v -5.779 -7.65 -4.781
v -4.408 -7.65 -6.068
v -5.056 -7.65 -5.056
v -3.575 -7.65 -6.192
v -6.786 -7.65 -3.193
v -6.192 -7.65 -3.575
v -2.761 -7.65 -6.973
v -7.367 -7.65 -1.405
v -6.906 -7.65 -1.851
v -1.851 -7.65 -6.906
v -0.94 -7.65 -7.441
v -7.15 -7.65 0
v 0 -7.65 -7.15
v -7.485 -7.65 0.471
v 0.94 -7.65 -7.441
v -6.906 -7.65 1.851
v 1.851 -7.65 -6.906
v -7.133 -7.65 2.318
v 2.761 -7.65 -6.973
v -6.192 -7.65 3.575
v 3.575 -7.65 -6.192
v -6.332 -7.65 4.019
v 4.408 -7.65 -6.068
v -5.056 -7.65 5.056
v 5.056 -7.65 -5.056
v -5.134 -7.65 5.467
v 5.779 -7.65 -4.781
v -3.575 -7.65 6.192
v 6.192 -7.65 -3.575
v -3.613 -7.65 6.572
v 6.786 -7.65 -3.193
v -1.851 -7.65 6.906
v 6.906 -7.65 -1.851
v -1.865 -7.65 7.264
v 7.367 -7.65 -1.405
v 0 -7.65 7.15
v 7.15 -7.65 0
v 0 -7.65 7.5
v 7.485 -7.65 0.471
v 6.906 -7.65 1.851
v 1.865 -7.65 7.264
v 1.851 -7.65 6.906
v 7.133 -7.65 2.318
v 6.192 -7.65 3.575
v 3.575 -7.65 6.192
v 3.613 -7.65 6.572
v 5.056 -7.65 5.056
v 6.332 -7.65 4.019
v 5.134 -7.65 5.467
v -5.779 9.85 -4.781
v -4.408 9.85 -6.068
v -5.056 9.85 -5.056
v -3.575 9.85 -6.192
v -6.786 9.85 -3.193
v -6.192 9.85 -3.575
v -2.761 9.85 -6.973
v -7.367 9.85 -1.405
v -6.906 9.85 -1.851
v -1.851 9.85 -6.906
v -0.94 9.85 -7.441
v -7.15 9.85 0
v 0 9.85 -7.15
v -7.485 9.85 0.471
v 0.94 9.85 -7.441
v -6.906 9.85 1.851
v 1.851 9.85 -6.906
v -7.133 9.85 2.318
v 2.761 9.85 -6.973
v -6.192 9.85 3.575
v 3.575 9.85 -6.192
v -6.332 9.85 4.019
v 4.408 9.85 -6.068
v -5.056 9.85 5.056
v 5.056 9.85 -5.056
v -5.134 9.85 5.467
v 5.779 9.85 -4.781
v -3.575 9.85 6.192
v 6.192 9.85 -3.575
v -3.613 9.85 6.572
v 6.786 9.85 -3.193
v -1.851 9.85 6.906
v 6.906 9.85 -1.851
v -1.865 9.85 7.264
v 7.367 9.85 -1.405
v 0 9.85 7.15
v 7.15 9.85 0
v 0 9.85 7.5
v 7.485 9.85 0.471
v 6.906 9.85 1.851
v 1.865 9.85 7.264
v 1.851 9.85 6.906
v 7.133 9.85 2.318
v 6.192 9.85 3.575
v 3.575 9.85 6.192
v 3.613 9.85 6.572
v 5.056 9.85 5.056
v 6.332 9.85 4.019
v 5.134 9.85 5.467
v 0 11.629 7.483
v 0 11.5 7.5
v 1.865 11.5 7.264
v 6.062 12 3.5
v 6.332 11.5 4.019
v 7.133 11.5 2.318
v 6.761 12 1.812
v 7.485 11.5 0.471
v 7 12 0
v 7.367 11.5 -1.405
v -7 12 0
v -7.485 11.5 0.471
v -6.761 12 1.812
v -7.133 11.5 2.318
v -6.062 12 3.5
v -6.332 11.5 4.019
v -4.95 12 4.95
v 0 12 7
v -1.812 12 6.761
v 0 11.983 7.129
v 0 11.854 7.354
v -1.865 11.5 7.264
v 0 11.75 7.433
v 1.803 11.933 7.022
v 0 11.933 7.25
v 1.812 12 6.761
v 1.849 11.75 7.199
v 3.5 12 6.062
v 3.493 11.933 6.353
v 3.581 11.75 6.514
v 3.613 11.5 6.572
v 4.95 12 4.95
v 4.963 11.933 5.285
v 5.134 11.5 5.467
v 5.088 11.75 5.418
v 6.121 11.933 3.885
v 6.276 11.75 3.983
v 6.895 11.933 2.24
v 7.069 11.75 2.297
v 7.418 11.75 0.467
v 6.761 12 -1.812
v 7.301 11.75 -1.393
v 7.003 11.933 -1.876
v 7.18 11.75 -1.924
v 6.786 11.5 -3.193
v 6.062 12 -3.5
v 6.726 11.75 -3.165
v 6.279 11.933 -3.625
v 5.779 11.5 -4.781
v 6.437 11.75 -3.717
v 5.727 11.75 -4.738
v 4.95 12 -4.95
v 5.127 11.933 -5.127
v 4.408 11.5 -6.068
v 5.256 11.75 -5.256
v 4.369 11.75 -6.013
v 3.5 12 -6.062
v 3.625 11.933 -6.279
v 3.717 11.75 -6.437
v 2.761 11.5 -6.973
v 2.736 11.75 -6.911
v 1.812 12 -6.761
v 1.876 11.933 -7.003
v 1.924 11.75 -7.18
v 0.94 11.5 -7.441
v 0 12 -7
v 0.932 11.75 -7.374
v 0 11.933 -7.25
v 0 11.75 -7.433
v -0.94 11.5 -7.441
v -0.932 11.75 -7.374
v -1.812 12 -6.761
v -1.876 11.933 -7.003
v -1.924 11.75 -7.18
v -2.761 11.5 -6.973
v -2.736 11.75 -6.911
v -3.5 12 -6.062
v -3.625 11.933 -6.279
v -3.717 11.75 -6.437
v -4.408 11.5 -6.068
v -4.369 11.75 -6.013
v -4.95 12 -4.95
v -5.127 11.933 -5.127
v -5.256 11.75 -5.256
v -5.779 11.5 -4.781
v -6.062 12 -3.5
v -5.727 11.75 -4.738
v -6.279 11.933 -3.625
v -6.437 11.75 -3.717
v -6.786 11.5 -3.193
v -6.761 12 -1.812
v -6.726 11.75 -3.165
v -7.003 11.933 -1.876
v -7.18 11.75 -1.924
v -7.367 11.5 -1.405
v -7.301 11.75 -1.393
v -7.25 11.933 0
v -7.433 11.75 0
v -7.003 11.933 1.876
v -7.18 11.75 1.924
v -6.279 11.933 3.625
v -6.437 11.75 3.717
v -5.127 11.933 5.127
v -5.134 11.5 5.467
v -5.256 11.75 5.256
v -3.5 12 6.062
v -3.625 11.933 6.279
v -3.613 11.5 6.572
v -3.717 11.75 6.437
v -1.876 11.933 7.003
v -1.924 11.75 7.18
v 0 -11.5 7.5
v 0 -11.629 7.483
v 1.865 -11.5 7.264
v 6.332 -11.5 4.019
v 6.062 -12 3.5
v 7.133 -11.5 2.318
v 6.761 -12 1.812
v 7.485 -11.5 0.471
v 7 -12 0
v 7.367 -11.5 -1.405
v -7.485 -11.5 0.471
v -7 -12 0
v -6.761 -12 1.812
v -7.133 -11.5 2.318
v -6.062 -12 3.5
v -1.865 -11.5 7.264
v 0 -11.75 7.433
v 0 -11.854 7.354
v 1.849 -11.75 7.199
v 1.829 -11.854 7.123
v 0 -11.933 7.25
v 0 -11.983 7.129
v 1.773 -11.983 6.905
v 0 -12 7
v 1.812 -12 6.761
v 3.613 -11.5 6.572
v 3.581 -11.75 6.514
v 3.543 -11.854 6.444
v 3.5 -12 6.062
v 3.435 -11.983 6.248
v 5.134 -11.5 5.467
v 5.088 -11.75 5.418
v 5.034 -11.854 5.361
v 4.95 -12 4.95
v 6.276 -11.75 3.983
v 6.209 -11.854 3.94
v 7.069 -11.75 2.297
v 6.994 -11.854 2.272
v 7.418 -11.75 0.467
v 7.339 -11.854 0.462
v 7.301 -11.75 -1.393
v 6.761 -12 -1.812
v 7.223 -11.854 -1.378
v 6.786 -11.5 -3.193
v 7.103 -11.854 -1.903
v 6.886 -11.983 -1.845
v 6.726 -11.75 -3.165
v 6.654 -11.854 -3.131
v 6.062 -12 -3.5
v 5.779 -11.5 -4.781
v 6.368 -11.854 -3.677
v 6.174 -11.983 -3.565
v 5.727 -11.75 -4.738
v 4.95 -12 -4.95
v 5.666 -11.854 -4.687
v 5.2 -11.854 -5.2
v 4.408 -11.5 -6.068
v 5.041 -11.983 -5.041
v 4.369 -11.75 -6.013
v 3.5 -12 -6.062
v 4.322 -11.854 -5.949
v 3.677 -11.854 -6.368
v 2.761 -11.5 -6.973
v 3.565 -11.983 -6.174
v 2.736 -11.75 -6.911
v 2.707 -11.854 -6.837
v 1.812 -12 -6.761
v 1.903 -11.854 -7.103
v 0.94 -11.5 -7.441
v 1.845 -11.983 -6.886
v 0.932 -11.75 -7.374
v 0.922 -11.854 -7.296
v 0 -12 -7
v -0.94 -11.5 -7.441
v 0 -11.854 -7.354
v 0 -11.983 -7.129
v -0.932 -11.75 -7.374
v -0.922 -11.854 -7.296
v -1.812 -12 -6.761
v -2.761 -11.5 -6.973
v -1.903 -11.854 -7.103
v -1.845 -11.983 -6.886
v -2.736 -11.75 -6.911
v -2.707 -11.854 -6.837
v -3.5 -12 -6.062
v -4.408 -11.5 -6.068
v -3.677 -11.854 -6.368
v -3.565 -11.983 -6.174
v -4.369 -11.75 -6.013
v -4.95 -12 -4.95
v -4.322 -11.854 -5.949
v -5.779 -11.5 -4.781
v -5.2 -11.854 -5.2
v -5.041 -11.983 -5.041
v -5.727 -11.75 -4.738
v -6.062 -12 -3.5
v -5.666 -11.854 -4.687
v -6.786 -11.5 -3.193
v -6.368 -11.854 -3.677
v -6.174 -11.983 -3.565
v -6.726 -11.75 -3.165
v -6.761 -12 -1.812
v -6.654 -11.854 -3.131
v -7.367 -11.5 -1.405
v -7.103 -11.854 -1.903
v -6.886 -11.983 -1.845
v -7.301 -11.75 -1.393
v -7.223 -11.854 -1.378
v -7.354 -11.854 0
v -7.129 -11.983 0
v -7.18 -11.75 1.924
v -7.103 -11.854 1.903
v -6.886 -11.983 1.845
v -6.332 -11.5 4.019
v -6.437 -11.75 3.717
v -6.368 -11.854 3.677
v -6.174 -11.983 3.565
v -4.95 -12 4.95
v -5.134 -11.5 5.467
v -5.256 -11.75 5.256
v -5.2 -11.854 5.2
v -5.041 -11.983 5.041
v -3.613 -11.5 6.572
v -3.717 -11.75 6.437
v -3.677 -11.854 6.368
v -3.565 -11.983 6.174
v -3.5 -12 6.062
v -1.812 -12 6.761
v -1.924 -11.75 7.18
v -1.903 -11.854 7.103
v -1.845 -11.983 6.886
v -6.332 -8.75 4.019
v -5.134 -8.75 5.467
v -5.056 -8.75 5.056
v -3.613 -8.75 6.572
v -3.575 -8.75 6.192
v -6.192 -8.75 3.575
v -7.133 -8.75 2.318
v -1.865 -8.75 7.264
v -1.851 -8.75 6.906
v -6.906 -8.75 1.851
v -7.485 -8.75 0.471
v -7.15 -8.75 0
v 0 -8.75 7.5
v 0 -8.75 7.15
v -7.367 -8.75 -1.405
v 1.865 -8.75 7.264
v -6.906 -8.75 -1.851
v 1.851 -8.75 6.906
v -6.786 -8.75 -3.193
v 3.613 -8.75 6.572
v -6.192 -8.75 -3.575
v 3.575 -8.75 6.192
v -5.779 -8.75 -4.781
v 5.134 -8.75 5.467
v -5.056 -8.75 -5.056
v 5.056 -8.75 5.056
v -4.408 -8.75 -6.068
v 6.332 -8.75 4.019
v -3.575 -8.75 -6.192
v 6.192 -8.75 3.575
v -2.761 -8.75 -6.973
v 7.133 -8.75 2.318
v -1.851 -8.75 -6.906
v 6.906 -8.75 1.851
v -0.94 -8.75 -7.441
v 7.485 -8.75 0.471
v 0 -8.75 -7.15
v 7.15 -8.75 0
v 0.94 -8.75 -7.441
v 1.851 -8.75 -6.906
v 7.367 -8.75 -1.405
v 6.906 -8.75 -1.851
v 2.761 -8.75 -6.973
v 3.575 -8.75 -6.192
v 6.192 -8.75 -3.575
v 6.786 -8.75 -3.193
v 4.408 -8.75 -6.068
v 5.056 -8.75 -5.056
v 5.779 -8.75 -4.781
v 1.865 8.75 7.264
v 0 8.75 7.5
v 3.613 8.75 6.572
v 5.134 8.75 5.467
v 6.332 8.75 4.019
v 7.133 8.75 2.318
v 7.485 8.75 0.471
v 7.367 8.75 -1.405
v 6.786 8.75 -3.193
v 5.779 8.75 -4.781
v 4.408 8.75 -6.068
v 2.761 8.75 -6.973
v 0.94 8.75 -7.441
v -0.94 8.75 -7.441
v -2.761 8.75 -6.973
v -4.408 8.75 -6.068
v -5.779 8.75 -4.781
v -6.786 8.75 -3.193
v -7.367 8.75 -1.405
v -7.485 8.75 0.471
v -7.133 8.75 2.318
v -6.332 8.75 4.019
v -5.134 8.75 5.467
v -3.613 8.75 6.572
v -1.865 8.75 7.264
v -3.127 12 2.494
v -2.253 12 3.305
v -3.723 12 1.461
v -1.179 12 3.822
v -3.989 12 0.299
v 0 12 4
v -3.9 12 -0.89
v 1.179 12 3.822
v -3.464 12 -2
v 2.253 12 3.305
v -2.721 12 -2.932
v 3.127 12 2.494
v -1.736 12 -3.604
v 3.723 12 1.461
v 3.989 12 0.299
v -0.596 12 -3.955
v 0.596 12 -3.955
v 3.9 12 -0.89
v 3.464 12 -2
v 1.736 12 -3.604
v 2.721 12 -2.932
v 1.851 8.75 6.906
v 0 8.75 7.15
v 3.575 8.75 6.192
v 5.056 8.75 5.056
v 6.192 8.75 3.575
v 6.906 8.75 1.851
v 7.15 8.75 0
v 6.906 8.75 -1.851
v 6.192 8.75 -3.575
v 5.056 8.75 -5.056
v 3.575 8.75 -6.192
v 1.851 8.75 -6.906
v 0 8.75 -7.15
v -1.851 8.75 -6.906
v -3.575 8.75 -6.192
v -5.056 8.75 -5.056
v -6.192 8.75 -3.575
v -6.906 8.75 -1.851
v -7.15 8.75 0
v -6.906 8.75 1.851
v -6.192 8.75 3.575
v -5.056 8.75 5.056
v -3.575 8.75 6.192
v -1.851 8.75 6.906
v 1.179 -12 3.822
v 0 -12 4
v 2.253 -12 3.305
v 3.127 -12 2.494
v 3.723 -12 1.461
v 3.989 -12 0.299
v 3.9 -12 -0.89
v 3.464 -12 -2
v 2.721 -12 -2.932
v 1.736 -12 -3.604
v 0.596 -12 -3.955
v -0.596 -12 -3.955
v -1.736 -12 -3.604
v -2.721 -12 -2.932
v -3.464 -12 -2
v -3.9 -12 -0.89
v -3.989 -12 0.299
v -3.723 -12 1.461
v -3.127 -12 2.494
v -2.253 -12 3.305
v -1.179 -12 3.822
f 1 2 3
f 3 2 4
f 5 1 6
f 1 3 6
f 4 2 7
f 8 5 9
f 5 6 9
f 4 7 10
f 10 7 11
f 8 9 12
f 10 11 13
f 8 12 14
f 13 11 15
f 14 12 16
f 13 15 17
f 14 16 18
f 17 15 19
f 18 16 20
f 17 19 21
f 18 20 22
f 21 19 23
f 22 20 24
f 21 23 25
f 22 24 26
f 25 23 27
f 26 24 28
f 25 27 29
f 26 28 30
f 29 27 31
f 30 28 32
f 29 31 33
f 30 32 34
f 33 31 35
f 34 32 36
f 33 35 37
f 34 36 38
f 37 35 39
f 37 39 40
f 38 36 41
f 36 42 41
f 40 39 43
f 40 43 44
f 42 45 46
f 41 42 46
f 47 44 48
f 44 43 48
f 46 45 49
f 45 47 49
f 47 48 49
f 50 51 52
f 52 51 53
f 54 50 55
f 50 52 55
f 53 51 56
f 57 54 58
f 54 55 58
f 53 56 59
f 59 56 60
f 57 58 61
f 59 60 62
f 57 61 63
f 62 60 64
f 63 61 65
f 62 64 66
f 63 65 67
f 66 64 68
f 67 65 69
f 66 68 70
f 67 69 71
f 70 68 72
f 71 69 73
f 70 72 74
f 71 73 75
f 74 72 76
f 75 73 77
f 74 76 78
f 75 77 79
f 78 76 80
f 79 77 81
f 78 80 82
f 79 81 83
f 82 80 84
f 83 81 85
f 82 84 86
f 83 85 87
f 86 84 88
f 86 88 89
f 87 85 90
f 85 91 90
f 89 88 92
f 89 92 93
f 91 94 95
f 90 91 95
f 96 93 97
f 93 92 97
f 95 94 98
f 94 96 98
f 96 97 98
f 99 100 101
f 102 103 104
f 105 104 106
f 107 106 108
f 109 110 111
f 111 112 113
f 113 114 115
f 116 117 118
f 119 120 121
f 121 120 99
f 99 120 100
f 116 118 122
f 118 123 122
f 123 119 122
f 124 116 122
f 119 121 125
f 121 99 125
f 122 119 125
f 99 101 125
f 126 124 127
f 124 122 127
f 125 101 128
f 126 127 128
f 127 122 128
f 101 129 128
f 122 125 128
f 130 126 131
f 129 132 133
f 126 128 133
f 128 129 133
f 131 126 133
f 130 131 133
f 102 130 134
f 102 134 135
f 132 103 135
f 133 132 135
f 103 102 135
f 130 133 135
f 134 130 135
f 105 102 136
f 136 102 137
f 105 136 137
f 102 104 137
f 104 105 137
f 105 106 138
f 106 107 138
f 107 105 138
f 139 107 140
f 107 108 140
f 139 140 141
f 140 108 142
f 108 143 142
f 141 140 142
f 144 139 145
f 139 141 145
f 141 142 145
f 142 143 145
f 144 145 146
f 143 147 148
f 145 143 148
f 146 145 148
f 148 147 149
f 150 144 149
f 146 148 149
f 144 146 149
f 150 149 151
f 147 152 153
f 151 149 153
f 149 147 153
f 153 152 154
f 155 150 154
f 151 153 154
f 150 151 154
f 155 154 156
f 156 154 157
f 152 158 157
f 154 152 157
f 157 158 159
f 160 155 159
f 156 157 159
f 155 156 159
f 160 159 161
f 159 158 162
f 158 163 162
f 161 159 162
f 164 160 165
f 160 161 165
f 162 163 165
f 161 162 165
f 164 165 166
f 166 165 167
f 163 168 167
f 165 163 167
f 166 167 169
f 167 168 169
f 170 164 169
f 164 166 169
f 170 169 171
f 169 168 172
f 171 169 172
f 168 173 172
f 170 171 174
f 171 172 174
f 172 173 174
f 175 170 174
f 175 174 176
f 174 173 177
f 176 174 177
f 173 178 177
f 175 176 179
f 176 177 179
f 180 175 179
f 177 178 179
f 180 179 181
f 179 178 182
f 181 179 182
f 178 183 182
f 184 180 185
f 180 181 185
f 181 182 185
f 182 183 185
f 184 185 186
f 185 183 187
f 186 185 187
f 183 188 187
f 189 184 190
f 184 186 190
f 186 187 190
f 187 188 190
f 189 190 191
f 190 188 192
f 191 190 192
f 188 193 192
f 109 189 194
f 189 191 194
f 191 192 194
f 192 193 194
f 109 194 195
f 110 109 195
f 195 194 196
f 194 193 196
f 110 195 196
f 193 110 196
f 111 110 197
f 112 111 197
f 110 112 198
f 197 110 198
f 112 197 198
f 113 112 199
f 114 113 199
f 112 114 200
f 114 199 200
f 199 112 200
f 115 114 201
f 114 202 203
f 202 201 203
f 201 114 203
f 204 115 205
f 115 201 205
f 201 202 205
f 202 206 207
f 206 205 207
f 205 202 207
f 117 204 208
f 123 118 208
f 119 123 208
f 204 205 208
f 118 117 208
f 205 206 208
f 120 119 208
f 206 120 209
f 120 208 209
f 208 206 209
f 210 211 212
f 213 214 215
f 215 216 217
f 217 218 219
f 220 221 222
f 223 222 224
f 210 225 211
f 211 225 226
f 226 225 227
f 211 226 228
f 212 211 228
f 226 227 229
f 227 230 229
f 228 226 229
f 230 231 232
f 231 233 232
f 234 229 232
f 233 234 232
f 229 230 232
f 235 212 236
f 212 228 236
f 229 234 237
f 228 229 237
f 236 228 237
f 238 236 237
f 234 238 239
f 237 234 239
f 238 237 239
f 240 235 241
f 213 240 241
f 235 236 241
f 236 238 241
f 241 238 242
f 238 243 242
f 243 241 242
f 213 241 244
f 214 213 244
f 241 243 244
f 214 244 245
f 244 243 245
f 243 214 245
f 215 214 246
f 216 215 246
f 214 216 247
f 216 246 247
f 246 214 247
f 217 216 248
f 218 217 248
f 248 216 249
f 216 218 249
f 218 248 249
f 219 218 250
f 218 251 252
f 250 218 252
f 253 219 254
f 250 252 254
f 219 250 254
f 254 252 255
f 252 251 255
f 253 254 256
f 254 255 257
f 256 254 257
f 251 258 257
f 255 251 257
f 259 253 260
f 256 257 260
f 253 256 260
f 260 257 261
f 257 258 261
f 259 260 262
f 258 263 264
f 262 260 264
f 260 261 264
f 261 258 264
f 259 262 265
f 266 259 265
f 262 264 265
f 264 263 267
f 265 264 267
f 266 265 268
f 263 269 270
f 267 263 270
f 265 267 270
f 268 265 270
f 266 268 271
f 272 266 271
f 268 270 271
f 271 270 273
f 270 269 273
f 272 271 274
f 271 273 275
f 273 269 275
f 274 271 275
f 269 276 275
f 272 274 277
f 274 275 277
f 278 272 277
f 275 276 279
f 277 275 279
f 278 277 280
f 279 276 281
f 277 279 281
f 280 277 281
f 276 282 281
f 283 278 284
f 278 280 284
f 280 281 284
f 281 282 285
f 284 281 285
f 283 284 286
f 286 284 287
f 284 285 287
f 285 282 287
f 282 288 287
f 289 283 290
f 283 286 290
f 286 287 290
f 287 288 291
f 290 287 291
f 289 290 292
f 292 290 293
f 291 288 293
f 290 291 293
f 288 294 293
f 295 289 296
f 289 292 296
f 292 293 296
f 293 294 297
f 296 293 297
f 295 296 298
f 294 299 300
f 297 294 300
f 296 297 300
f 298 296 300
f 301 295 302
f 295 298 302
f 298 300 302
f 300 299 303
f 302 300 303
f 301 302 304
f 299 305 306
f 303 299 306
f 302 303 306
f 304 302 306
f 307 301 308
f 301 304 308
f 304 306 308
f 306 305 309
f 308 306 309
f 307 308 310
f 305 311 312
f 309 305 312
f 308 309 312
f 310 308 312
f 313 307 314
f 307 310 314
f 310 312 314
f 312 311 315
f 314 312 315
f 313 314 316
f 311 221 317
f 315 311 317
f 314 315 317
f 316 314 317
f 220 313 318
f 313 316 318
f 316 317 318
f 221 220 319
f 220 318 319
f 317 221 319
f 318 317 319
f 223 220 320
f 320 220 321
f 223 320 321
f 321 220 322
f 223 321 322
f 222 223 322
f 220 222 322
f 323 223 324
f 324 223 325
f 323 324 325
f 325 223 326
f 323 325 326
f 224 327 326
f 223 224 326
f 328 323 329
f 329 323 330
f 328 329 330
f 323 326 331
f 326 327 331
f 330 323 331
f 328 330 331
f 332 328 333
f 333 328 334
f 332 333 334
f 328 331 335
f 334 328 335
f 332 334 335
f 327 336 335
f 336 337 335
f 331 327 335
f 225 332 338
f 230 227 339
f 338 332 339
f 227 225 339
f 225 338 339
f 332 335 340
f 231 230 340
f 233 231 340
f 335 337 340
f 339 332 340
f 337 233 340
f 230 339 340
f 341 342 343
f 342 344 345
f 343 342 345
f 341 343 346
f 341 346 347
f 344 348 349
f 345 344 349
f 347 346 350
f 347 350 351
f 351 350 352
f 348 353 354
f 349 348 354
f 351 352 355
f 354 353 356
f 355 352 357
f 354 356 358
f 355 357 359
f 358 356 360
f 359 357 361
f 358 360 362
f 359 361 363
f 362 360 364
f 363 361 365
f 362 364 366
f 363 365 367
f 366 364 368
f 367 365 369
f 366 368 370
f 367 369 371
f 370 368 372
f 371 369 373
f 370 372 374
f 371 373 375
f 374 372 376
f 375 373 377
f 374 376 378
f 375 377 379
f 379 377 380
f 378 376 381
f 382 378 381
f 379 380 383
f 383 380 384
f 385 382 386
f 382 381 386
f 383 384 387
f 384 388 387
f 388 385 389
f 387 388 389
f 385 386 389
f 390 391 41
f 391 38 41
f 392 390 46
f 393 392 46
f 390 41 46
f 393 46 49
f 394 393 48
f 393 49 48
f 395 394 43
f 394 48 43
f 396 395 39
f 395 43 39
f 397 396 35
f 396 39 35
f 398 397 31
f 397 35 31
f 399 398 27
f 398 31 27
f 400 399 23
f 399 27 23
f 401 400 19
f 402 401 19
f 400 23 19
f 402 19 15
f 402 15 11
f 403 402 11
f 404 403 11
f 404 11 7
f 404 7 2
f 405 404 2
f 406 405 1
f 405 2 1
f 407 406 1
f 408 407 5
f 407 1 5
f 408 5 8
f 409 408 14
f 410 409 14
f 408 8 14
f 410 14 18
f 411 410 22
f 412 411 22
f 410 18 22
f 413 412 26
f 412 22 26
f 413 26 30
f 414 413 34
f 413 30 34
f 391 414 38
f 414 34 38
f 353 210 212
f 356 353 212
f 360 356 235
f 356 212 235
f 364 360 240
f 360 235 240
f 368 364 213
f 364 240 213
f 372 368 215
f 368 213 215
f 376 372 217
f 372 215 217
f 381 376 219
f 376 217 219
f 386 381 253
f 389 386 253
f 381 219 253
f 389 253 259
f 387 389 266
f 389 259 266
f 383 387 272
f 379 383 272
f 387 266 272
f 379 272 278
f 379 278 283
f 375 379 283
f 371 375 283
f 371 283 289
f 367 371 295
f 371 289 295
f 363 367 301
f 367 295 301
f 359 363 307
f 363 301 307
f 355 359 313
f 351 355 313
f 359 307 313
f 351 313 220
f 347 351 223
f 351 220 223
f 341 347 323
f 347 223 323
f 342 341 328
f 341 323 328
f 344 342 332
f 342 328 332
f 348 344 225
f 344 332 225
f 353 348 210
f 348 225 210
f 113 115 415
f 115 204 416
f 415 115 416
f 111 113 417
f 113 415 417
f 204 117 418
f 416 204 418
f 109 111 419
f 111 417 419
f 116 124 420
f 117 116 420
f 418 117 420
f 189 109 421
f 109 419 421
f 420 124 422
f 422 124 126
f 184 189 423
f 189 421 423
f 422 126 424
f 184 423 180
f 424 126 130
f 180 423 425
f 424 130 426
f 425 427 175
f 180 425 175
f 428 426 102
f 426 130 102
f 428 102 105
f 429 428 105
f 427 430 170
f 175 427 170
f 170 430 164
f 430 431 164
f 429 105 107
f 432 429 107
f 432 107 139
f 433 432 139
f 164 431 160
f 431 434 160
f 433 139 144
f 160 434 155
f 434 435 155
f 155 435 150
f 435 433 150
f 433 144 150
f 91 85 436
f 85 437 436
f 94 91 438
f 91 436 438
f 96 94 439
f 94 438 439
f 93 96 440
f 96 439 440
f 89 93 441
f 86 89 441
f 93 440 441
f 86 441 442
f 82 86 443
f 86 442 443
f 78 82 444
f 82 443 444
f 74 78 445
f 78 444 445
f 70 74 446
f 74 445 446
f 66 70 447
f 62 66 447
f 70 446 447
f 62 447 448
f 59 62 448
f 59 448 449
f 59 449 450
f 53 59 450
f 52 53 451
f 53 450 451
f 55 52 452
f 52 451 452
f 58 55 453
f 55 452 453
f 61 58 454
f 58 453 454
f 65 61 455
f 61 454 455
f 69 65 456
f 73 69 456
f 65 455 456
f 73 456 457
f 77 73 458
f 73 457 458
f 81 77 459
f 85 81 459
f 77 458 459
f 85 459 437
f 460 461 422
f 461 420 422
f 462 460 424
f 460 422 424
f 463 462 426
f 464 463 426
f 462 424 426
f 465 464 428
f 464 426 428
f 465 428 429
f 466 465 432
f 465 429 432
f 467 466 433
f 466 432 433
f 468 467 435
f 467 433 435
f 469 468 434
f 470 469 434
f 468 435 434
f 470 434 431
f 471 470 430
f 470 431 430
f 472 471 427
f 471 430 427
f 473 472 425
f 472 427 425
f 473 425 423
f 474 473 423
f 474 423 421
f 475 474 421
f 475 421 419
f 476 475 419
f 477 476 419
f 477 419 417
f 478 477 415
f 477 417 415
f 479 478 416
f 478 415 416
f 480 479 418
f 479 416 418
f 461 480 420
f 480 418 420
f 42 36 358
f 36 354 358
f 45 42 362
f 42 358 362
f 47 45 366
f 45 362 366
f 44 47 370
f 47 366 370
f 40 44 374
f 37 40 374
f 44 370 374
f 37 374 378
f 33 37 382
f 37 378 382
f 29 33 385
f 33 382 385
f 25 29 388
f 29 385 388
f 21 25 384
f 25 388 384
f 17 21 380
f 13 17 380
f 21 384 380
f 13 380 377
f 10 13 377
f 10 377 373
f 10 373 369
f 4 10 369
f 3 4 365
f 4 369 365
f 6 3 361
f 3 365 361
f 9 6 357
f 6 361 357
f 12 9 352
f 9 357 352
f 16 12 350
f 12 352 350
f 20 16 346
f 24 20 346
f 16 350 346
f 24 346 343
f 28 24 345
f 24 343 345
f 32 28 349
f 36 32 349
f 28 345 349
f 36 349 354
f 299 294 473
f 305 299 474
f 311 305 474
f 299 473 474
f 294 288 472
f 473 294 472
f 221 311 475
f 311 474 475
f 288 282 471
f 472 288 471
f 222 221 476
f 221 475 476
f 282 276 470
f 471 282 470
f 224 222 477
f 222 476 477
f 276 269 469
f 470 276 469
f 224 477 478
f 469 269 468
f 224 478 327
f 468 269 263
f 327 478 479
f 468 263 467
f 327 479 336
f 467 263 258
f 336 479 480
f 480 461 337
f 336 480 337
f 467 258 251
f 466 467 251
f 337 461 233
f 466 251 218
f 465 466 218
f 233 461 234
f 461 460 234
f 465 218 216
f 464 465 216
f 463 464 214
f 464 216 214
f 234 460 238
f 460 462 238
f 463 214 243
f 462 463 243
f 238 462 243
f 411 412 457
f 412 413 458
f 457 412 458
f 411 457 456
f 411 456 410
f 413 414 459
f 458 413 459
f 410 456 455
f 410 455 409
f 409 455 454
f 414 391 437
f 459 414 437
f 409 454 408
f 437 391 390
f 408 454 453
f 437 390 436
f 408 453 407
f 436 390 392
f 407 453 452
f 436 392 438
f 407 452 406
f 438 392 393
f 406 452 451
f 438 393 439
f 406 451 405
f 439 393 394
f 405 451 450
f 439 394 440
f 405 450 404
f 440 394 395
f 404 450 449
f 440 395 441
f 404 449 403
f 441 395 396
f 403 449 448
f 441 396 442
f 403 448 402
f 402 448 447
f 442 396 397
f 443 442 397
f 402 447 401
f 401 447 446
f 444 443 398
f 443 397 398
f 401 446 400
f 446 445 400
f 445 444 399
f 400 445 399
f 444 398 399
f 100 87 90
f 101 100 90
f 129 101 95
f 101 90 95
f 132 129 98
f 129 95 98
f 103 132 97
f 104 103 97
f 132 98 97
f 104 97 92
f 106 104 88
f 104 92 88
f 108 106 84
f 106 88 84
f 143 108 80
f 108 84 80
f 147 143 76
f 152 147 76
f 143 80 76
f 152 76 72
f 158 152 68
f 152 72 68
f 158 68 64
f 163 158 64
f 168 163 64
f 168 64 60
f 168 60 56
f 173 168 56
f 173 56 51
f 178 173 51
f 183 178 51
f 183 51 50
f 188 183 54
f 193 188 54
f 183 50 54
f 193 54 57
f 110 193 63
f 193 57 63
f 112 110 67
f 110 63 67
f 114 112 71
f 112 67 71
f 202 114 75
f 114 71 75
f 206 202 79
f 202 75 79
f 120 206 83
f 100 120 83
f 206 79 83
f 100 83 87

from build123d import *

# Parameters (mm, degrees)
F2_R = 0.5


with BuildPart() as f1:
    # F0 (on Right) → F1 (revolve)
    with BuildSketch(Plane.YZ):
        Polygon((-8.75, 7.5), (-12, 7.5), (-12, 4), (12, 4), (12, 7.5), (9.85, 7.5), (9.85, 7.15), (8.75, 7.15), (8.75, 7.5), (-7.65, 7.5), (-7.65, 7.15), (-8.75, 7.15), align=None)
    revolve(axis=Axis((0, 2.064935, 0), (0, 1, 0)))

    # F2
    f2_edges = [f1.edges().sort_by_distance(p)[0] for p in [
        (0, 12, -7.5),
        (0, -12, -7.5),
    ]]
    fillet(f2_edges, radius=F2_R)


solid = f1.part
